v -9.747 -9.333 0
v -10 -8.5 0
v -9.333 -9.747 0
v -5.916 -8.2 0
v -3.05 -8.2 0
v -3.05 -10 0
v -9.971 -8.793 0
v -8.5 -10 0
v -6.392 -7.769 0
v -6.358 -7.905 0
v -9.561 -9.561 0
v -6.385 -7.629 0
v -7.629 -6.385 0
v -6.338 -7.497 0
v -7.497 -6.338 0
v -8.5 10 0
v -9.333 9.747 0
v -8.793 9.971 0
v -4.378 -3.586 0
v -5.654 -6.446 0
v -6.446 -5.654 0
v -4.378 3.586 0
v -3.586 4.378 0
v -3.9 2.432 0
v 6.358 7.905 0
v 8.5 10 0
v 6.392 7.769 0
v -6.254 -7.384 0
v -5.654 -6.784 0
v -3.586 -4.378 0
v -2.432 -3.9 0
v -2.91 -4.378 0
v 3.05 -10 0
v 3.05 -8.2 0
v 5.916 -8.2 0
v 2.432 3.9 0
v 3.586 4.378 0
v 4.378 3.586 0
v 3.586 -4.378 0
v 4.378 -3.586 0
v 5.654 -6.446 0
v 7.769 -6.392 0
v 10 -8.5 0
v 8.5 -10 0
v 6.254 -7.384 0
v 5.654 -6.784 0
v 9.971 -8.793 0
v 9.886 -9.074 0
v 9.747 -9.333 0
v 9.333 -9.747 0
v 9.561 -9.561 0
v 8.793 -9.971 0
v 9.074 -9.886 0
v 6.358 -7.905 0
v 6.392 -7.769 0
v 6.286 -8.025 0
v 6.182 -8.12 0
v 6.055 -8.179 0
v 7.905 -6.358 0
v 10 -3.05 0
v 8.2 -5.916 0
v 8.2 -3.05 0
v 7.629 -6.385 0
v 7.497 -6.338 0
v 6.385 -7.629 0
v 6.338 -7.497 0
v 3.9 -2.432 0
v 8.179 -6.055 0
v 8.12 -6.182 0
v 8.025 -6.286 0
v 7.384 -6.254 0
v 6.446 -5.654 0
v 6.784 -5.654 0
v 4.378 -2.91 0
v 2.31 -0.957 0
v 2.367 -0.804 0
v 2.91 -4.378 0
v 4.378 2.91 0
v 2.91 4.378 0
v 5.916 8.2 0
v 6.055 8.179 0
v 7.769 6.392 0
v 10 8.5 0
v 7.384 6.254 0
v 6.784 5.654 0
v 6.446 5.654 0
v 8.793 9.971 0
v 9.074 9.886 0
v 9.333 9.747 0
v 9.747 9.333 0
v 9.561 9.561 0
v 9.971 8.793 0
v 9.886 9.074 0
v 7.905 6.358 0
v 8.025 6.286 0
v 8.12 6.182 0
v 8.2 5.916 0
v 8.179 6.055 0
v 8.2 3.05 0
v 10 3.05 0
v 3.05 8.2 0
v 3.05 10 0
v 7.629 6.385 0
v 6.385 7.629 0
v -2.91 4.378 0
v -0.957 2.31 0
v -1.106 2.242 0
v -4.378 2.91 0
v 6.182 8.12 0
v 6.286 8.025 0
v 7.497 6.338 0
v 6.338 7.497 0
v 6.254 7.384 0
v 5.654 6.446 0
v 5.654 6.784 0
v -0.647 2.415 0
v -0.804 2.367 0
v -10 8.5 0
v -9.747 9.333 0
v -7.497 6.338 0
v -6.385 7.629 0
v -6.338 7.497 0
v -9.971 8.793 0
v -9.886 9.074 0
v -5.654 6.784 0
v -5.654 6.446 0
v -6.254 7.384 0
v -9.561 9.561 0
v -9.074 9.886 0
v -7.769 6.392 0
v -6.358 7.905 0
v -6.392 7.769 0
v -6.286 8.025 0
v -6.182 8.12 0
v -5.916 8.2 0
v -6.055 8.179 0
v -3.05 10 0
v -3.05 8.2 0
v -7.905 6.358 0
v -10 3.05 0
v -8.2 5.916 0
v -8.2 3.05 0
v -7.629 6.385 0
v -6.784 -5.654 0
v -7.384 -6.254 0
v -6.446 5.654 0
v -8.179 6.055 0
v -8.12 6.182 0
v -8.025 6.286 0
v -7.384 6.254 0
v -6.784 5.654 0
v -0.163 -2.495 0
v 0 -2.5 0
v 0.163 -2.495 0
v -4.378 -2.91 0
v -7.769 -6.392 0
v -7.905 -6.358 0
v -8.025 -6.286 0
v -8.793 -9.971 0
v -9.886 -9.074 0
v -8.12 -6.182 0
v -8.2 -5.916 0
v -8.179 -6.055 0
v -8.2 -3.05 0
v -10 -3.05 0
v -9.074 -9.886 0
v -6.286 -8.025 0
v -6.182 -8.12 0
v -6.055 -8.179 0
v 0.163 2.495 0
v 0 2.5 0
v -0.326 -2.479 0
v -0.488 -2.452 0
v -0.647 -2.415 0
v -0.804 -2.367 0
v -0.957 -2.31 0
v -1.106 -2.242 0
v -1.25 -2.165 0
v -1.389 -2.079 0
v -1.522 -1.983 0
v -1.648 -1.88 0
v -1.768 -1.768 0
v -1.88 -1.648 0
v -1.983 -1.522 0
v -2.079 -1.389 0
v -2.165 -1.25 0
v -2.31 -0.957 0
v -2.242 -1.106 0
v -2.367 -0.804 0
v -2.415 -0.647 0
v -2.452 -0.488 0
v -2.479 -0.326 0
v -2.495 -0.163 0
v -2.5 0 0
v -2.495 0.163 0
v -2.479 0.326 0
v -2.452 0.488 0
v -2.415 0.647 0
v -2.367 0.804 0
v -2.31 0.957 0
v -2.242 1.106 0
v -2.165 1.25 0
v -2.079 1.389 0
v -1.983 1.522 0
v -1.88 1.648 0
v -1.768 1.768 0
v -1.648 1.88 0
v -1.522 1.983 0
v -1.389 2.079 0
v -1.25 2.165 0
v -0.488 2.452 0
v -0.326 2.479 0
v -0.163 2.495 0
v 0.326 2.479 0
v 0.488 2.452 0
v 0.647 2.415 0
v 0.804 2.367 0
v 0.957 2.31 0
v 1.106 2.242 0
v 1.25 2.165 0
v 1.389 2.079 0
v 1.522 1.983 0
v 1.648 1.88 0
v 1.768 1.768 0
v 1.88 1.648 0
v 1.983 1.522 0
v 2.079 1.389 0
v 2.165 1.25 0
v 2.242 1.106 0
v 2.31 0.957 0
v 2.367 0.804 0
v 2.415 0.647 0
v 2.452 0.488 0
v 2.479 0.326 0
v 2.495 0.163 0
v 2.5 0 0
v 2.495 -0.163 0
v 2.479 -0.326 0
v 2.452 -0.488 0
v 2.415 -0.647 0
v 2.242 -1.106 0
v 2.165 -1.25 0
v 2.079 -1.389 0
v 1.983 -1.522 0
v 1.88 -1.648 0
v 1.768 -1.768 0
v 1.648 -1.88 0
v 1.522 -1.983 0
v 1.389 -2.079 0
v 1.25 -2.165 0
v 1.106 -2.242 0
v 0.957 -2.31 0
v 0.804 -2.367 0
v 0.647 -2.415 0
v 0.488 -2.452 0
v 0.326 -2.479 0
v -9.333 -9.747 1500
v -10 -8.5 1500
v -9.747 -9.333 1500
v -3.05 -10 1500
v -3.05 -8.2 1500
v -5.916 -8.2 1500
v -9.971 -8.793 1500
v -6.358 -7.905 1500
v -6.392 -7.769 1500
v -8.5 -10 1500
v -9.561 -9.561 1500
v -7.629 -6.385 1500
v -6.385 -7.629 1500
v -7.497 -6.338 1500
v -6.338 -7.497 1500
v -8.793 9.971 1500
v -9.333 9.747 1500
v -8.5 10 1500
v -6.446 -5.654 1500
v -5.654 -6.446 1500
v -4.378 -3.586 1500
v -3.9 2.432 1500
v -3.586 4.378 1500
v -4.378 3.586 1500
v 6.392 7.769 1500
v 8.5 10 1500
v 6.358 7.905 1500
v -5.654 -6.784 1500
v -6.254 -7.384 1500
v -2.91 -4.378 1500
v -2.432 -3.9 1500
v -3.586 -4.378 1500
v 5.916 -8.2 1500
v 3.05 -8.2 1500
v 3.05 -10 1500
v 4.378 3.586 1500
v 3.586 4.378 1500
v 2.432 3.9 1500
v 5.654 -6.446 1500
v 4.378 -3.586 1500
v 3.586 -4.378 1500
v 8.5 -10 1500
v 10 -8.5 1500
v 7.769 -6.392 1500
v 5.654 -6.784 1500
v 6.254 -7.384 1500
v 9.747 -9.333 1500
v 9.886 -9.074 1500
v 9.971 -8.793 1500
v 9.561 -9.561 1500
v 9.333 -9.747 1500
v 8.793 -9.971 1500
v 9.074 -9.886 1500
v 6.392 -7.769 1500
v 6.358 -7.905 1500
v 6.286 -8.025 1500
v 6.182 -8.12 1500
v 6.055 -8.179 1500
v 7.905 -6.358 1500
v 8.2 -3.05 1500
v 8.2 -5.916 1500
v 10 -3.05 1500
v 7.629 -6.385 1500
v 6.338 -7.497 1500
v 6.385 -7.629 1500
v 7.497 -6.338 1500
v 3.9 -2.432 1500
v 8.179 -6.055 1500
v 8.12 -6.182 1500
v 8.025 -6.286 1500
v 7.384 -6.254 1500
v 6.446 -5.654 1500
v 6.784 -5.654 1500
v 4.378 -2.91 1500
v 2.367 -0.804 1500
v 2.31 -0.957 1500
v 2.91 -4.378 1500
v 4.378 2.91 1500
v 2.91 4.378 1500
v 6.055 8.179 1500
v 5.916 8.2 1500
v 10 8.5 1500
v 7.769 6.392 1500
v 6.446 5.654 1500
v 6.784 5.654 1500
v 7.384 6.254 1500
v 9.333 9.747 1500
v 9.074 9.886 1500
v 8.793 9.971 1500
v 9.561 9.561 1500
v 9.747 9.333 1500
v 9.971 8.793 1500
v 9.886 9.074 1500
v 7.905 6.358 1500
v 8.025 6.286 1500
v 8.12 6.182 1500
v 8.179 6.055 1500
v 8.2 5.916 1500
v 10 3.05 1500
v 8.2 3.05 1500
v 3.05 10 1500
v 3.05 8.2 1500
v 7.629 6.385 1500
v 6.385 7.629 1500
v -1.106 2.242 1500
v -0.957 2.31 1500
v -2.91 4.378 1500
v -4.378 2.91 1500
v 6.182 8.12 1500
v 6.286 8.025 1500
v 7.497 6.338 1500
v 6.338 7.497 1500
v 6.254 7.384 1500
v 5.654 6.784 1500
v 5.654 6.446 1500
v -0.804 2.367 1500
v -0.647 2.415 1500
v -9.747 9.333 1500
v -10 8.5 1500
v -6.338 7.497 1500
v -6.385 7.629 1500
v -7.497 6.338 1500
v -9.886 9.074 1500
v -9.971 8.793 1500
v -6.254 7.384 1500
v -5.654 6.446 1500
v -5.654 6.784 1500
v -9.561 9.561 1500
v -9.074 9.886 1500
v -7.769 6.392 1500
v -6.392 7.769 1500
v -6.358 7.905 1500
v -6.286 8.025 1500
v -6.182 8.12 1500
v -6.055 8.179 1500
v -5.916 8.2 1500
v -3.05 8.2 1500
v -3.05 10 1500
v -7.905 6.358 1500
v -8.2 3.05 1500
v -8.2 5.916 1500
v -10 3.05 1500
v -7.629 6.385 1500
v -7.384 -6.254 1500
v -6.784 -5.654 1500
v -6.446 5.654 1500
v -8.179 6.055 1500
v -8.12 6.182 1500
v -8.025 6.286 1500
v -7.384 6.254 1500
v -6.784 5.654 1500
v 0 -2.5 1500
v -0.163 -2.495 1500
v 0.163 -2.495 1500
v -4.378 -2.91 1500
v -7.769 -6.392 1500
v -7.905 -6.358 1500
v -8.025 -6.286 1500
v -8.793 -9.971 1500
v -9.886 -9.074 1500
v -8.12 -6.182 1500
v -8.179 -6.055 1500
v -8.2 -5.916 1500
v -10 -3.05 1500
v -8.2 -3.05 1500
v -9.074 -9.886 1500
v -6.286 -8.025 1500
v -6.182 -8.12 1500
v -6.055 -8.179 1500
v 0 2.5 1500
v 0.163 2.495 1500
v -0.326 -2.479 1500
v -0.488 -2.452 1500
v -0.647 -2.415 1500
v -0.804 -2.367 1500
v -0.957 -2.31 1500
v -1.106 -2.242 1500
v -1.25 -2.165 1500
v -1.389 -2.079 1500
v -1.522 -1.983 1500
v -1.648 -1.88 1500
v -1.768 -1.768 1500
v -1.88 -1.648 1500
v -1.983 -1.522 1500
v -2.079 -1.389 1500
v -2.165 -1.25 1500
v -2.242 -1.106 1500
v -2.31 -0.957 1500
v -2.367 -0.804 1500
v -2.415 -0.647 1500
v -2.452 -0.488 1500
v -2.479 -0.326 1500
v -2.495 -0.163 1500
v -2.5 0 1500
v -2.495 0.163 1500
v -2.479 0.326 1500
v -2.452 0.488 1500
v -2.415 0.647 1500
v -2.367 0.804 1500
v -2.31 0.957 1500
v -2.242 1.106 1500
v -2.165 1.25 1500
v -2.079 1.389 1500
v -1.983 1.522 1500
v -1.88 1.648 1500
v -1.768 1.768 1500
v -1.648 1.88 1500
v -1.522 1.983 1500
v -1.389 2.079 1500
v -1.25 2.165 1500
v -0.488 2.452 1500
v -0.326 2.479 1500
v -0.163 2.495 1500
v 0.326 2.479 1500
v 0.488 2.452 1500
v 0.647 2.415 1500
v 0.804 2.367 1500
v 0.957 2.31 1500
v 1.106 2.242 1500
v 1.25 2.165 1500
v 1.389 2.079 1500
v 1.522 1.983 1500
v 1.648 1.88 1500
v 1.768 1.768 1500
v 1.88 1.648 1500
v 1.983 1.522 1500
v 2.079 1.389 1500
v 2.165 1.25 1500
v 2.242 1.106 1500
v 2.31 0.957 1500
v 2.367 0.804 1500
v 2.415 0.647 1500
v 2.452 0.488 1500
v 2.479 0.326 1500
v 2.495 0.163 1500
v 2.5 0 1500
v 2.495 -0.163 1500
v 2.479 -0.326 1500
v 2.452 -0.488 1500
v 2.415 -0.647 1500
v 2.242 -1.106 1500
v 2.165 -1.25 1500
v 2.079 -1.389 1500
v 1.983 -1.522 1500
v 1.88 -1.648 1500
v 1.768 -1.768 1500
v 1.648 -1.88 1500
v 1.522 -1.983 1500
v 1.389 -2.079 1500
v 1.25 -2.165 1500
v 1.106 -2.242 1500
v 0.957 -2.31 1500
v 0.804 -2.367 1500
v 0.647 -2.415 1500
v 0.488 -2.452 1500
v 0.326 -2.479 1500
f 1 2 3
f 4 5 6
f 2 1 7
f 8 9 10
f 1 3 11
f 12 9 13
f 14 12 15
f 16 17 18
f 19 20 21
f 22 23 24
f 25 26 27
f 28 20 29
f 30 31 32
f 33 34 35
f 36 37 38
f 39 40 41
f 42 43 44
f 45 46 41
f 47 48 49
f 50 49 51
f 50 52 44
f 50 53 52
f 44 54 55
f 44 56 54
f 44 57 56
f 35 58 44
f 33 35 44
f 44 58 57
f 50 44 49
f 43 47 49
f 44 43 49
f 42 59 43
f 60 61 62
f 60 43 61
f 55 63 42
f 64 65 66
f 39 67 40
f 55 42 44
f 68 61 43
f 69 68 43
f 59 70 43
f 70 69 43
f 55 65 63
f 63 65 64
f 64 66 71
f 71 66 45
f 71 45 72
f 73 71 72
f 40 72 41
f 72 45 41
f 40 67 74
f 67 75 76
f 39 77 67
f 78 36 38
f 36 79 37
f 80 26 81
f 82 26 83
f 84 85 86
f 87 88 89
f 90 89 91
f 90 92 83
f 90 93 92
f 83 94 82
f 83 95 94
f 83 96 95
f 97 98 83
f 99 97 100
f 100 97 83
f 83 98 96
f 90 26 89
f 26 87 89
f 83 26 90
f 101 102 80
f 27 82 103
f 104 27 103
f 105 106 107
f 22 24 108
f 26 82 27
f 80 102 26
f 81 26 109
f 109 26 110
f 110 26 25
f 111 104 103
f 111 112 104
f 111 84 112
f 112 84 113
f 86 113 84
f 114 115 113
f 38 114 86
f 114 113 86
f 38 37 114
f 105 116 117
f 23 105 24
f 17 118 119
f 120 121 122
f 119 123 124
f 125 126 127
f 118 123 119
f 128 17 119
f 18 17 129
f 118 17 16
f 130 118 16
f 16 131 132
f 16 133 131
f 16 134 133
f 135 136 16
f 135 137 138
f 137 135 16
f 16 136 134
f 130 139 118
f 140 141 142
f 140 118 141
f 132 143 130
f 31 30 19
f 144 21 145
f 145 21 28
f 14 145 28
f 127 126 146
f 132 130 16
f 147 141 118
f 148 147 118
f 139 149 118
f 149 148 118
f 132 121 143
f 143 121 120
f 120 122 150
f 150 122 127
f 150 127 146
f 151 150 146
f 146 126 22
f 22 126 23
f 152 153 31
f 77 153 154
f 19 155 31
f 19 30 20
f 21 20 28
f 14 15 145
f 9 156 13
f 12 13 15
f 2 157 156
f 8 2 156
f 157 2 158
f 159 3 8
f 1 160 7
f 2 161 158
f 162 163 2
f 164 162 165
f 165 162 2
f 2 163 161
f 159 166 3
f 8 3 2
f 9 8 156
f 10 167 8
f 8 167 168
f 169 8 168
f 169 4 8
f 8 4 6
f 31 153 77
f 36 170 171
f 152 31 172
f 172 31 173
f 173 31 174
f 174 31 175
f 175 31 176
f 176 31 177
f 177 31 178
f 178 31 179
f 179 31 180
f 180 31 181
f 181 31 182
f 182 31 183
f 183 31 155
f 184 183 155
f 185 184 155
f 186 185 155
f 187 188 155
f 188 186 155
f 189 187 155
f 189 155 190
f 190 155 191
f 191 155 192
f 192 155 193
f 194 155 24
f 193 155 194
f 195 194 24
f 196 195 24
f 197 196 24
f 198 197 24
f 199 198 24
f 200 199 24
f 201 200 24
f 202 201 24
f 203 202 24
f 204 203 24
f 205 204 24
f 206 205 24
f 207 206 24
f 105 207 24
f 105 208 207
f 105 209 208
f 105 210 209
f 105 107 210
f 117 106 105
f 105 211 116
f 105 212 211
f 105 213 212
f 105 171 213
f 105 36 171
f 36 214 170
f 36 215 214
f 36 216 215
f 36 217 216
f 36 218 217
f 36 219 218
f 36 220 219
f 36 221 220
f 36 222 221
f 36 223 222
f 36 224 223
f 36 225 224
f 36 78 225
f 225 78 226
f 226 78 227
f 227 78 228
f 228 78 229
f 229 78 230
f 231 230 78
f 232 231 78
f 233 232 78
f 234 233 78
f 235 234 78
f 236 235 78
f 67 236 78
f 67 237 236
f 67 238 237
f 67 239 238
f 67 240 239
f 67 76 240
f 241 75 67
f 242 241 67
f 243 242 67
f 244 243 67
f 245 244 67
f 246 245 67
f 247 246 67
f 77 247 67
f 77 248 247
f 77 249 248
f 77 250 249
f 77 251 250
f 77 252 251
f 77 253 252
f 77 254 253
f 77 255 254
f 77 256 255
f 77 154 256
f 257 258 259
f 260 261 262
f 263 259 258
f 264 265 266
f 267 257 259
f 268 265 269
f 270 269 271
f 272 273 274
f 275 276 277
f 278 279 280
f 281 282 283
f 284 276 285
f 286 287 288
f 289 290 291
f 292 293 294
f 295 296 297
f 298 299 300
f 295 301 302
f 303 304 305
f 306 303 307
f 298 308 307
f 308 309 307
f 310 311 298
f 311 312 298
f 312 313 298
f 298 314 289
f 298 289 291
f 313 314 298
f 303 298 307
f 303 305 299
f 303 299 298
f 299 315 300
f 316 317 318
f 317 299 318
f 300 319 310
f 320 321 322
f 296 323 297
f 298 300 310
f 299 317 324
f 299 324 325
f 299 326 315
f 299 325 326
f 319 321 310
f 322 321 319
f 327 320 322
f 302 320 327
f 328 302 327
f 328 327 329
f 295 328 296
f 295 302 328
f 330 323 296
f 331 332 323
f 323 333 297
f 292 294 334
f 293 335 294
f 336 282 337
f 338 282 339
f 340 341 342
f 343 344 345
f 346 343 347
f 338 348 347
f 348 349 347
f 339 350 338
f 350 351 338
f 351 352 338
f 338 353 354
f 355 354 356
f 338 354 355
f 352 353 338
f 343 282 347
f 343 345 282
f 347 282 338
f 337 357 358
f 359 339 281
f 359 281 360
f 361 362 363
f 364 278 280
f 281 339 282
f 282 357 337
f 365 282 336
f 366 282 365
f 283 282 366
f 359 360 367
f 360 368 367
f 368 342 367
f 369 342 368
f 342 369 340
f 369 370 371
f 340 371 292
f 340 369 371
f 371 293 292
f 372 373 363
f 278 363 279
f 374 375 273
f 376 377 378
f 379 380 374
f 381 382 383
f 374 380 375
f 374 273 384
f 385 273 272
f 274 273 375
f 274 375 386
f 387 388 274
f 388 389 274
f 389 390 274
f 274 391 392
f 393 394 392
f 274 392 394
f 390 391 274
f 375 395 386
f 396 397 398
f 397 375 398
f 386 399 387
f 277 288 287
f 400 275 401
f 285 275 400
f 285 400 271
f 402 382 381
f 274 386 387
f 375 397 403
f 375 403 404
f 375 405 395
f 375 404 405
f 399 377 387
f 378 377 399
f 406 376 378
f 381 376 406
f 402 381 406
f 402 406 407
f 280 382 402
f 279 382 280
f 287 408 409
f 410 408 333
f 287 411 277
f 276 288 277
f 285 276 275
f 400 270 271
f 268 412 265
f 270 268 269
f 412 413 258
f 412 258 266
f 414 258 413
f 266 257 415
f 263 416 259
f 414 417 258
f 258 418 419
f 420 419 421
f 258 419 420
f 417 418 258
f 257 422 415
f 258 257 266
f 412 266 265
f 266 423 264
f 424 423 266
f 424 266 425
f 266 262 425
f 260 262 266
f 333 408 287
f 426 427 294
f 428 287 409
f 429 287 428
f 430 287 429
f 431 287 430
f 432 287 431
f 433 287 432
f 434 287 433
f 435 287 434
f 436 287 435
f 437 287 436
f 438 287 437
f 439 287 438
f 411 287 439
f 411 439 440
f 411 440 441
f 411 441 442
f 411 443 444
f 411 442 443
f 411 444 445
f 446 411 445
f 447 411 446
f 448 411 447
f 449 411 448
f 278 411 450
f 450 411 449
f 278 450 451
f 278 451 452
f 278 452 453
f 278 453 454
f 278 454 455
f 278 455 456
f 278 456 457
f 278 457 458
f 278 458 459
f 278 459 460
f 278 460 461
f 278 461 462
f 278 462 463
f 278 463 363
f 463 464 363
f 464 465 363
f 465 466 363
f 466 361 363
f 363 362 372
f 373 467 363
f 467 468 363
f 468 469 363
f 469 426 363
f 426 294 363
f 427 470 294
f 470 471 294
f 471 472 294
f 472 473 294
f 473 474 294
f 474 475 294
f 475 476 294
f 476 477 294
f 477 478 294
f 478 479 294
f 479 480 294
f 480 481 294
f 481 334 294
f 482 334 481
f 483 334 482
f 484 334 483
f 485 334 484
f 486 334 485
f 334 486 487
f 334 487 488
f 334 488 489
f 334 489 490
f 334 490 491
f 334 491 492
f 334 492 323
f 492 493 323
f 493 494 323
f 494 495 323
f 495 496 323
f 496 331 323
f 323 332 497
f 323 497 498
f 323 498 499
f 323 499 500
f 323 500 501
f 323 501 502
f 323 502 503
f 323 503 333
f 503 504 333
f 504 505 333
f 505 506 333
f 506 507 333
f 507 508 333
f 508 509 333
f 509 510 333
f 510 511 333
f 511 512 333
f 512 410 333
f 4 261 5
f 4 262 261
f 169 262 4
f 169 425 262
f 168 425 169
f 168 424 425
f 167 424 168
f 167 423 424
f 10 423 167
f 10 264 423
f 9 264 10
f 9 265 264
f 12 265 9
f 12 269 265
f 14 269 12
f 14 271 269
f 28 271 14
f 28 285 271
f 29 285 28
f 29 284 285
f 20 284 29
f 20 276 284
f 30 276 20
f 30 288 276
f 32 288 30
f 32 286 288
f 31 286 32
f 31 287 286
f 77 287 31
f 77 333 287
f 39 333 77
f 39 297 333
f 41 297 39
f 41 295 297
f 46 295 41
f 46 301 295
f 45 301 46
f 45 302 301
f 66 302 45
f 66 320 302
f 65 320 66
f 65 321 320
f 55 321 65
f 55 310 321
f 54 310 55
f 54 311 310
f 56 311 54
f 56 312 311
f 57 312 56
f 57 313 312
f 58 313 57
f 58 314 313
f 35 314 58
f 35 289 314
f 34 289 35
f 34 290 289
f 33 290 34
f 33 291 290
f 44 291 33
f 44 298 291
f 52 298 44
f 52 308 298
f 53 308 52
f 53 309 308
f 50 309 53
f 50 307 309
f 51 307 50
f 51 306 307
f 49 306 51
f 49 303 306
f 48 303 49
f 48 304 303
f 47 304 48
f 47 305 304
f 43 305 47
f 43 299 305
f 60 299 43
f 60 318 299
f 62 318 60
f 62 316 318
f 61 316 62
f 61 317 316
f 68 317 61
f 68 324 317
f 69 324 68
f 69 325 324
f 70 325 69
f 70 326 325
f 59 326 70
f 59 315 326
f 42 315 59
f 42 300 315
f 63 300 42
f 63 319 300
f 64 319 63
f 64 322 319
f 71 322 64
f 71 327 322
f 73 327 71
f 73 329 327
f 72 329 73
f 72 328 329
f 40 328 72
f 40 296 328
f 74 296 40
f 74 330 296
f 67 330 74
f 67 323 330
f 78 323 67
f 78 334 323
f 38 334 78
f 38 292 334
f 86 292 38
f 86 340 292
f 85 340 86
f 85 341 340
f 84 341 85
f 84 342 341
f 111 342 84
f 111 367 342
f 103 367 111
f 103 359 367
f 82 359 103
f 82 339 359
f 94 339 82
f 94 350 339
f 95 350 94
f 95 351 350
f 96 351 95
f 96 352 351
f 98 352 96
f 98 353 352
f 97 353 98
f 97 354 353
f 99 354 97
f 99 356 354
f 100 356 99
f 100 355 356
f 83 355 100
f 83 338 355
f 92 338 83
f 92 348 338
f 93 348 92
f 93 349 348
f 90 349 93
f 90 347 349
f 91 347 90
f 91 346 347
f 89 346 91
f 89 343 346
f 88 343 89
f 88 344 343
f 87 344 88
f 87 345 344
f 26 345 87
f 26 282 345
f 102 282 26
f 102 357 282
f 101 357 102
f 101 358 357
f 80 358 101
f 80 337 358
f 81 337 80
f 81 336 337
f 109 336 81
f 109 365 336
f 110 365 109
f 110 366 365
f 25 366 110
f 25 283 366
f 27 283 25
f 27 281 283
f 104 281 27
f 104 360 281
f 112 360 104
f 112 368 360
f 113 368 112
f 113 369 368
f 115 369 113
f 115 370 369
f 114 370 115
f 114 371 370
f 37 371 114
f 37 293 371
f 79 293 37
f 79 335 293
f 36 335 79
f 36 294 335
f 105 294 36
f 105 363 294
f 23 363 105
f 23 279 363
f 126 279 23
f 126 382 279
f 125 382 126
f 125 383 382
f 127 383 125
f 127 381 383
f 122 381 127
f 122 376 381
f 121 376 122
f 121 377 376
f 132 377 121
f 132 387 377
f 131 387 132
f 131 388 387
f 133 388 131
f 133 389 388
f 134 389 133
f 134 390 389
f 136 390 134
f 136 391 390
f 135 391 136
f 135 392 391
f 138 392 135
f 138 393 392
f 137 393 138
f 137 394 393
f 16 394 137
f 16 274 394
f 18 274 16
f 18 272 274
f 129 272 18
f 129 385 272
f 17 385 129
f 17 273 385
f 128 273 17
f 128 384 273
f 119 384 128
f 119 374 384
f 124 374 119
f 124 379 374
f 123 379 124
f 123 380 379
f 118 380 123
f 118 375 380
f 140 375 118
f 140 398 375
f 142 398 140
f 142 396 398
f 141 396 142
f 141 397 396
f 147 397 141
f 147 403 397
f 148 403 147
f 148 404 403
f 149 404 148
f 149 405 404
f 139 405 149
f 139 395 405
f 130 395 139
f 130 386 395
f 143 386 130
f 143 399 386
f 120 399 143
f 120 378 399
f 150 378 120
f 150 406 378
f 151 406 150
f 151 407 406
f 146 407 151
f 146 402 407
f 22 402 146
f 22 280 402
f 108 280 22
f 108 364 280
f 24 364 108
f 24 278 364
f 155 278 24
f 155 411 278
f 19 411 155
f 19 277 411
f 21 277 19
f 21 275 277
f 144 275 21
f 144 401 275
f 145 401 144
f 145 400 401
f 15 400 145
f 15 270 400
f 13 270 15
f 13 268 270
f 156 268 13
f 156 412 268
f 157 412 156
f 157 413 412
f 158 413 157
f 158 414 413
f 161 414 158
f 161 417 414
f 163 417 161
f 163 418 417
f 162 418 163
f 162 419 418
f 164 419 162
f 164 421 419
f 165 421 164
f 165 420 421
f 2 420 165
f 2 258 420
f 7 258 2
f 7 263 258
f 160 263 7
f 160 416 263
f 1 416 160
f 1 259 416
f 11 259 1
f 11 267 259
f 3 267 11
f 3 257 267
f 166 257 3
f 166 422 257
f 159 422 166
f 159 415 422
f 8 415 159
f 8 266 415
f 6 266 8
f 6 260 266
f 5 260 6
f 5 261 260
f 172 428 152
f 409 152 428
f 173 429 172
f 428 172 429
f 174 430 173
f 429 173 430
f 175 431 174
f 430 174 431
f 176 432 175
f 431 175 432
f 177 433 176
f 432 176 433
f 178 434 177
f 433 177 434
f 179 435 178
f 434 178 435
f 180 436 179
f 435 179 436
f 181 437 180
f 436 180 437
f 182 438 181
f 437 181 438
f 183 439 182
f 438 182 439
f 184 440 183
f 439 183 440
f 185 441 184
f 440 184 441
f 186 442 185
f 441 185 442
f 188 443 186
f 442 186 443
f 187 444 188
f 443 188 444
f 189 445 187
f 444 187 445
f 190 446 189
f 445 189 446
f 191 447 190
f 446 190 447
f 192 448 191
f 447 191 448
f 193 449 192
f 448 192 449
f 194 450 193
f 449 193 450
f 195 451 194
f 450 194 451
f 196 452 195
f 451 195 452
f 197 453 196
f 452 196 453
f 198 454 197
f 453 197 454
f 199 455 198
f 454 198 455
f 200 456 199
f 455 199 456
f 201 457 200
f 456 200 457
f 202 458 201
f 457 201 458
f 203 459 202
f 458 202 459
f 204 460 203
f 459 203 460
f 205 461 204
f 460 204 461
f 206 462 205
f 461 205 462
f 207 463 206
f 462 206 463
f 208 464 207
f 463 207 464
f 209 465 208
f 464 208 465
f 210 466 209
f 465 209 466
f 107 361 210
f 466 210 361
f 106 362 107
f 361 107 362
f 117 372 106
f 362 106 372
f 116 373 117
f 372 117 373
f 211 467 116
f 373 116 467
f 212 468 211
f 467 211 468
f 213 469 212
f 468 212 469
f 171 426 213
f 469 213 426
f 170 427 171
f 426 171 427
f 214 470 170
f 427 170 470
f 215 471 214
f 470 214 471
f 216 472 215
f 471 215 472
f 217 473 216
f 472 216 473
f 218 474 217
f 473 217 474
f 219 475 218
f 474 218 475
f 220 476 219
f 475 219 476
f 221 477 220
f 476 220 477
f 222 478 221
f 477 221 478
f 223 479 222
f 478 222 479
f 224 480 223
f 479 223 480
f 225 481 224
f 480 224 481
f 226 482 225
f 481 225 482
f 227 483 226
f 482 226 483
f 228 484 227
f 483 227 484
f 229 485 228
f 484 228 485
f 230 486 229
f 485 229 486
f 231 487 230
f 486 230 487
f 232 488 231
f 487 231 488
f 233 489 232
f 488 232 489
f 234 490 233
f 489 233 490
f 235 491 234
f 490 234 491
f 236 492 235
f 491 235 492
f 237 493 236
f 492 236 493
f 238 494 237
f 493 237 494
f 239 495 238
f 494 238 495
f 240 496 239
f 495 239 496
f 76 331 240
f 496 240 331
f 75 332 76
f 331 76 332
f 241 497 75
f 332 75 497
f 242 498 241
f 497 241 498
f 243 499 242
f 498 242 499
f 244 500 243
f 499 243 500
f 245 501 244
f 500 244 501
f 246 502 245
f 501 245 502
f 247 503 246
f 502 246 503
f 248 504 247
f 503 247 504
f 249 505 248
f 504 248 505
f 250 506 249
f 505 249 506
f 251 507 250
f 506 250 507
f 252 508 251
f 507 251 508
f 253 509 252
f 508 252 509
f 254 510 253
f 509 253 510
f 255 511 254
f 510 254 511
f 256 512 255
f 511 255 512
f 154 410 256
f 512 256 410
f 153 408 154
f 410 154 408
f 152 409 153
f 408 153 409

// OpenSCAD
/* ---------------------------------------------------------------------------
   T-slot extruded aluminum, 20x20 mm — generic "M6 groove" profile matching
   Conrad/TRU Components item 2623292 (20 x 20 x 1000 mm, 6063-T6, groove M6).

   Unlike `t_slot_40x40.scad`, no vendor DXF exists for this part — only a
   raster technical drawing inside a PDF datasheet
   (`40x40_profile/20x20_profile.pdf`, despite the directory name; it was
   dropped in alongside the 40x40 vendor files). The clearly labelled figures
   from that drawing are used directly: overall 20x20 mm, 4x R1.5 outer
   corner fillets, a Ø5 mm center bore, and a 1.8 mm slot-lip thickness; the
   slot mouth is taken as 6.1 mm both because it's explicitly dimensioned and
   because it matches the datasheet's "Groove size m6" spec (mirroring how
   the 40x40's "Nut 10" spec matched its dimensioned 10.1 mm mouth). The
   internal channel geometry beyond those labelled figures (the diagonal
   undercut walls that key a T-nut in place) reuses the exact proportions
   validated from the 40x40's real vendor DXF, scaled so the boss depth
   lands on this drawing's own 6.1 mm figure — i.e. the *shape family* is
   exact, the last few tenths of a mm on the undercut walls are an informed
   approximation, not a vendor-verified value. Re-derive from a real DXF if
   one turns up, or correct from calipers per the house style's caliper-trust
   rule.

   Coordinate convention: cross-section centred on the bore axis (X=Y=0,
   profile spans -10..+10 both ways), extruded from Z=0 to Z=length.

   Purchased stock, not a printed part — no [Build Plate] or [Revision]
   group, same as `t_slot_40x40.scad`.

   REV 1.0: initial — 1.5 m stock length to match the 40x40 piece.
   --------------------------------------------------------------------------- */

/* [Extrusion] */
length   = 1500; // cut length along Z, mm  [50:50:6000]
bore_dia = 5;     // center through-bore diameter, mm (0 = solid, no bore)

/* [Render] */
$fn = $preview ? 32 : 96;

/* [Hidden] */
// Profile polygon, centred on the bore axis. See header for how this was
// derived (labelled datasheet figures + 40x40-proportioned undercut). Do not
// hand-edit — regenerate if a real vendor DXF or caliper measurements turn up.
profile_pts = [
    [-8.500,-10.000], [-3.050,-10.000], [-3.050,-8.200], [-5.916,-8.200], [-6.055,-8.179], [-6.182,-8.120],
    [-6.286,-8.025], [-6.358,-7.905], [-6.392,-7.769], [-6.385,-7.629], [-6.338,-7.497], [-6.254,-7.384],
    [-5.654,-6.784], [-5.654,-6.446], [-3.586,-4.378], [-2.910,-4.378], [-2.432,-3.900], [2.910,-4.378],
    [3.586,-4.378], [5.654,-6.446], [5.654,-6.784], [6.254,-7.384], [6.338,-7.497], [6.385,-7.629],
    [6.392,-7.769], [6.358,-7.905], [6.286,-8.025], [6.182,-8.120], [6.055,-8.179], [5.916,-8.200],
    [3.050,-8.200], [3.050,-10.000], [8.500,-10.000], [8.793,-9.971], [9.074,-9.886], [9.333,-9.747],
    [9.561,-9.561], [9.747,-9.333], [9.886,-9.074], [9.971,-8.793], [10.000,-8.500], [10.000,-3.050],
    [8.200,-3.050], [8.200,-5.916], [8.179,-6.055], [8.120,-6.182], [8.025,-6.286], [7.905,-6.358],
    [7.769,-6.392], [7.629,-6.385], [7.497,-6.338], [7.384,-6.254], [6.784,-5.654], [6.446,-5.654],
    [4.378,-3.586], [4.378,-2.910], [3.900,-2.432], [4.378,2.910], [4.378,3.586], [6.446,5.654],
    [6.784,5.654], [7.384,6.254], [7.497,6.338], [7.629,6.385], [7.769,6.392], [7.905,6.358],
    [8.025,6.286], [8.120,6.182], [8.179,6.055], [8.200,5.916], [8.200,3.050], [10.000,3.050],
    [10.000,8.500], [9.971,8.793], [9.886,9.074], [9.747,9.333], [9.561,9.561], [9.333,9.747],
    [9.074,9.886], [8.793,9.971], [8.500,10.000], [3.050,10.000], [3.050,8.200], [5.916,8.200],
    [6.055,8.179], [6.182,8.120], [6.286,8.025], [6.358,7.905], [6.392,7.769], [6.385,7.629],
    [6.338,7.497], [6.254,7.384], [5.654,6.784], [5.654,6.446], [3.586,4.378], [2.910,4.378],
    [2.432,3.900], [-2.910,4.378], [-3.586,4.378], [-5.654,6.446], [-5.654,6.784], [-6.254,7.384],
    [-6.338,7.497], [-6.385,7.629], [-6.392,7.769], [-6.358,7.905], [-6.286,8.025], [-6.182,8.120],
    [-6.055,8.179], [-5.916,8.200], [-3.050,8.200], [-3.050,10.000], [-8.500,10.000], [-8.793,9.971],
    [-9.074,9.886], [-9.333,9.747], [-9.561,9.561], [-9.747,9.333], [-9.886,9.074], [-9.971,8.793],
    [-10.000,8.500], [-10.000,3.050], [-8.200,3.050], [-8.200,5.916], [-8.179,6.055], [-8.120,6.182],
    [-8.025,6.286], [-7.905,6.358], [-7.769,6.392], [-7.629,6.385], [-7.497,6.338], [-7.384,6.254],
    [-6.784,5.654], [-6.446,5.654], [-4.378,3.586], [-4.378,2.910], [-3.900,2.432], [-4.378,-2.910],
    [-4.378,-3.586], [-6.446,-5.654], [-6.784,-5.654], [-7.384,-6.254], [-7.497,-6.338], [-7.629,-6.385],
    [-7.769,-6.392], [-7.905,-6.358], [-8.025,-6.286], [-8.120,-6.182], [-8.179,-6.055], [-8.200,-5.916],
    [-8.200,-3.050], [-10.000,-3.050], [-10.000,-8.500], [-9.971,-8.793], [-9.886,-9.074], [-9.747,-9.333],
    [-9.561,-9.561], [-9.333,-9.747], [-9.074,-9.886], [-8.793,-9.971],
];

// ---------------------------------------------------------------------------

module t_slot_20x20_profile() {
    difference() {
        polygon(points = profile_pts);
        if (bore_dia > 0) circle(d = bore_dia);
    }
}

module t_slot_20x20(len = length) {
    linear_extrude(height = len) t_slot_20x20_profile();
}

t_slot_20x20();
